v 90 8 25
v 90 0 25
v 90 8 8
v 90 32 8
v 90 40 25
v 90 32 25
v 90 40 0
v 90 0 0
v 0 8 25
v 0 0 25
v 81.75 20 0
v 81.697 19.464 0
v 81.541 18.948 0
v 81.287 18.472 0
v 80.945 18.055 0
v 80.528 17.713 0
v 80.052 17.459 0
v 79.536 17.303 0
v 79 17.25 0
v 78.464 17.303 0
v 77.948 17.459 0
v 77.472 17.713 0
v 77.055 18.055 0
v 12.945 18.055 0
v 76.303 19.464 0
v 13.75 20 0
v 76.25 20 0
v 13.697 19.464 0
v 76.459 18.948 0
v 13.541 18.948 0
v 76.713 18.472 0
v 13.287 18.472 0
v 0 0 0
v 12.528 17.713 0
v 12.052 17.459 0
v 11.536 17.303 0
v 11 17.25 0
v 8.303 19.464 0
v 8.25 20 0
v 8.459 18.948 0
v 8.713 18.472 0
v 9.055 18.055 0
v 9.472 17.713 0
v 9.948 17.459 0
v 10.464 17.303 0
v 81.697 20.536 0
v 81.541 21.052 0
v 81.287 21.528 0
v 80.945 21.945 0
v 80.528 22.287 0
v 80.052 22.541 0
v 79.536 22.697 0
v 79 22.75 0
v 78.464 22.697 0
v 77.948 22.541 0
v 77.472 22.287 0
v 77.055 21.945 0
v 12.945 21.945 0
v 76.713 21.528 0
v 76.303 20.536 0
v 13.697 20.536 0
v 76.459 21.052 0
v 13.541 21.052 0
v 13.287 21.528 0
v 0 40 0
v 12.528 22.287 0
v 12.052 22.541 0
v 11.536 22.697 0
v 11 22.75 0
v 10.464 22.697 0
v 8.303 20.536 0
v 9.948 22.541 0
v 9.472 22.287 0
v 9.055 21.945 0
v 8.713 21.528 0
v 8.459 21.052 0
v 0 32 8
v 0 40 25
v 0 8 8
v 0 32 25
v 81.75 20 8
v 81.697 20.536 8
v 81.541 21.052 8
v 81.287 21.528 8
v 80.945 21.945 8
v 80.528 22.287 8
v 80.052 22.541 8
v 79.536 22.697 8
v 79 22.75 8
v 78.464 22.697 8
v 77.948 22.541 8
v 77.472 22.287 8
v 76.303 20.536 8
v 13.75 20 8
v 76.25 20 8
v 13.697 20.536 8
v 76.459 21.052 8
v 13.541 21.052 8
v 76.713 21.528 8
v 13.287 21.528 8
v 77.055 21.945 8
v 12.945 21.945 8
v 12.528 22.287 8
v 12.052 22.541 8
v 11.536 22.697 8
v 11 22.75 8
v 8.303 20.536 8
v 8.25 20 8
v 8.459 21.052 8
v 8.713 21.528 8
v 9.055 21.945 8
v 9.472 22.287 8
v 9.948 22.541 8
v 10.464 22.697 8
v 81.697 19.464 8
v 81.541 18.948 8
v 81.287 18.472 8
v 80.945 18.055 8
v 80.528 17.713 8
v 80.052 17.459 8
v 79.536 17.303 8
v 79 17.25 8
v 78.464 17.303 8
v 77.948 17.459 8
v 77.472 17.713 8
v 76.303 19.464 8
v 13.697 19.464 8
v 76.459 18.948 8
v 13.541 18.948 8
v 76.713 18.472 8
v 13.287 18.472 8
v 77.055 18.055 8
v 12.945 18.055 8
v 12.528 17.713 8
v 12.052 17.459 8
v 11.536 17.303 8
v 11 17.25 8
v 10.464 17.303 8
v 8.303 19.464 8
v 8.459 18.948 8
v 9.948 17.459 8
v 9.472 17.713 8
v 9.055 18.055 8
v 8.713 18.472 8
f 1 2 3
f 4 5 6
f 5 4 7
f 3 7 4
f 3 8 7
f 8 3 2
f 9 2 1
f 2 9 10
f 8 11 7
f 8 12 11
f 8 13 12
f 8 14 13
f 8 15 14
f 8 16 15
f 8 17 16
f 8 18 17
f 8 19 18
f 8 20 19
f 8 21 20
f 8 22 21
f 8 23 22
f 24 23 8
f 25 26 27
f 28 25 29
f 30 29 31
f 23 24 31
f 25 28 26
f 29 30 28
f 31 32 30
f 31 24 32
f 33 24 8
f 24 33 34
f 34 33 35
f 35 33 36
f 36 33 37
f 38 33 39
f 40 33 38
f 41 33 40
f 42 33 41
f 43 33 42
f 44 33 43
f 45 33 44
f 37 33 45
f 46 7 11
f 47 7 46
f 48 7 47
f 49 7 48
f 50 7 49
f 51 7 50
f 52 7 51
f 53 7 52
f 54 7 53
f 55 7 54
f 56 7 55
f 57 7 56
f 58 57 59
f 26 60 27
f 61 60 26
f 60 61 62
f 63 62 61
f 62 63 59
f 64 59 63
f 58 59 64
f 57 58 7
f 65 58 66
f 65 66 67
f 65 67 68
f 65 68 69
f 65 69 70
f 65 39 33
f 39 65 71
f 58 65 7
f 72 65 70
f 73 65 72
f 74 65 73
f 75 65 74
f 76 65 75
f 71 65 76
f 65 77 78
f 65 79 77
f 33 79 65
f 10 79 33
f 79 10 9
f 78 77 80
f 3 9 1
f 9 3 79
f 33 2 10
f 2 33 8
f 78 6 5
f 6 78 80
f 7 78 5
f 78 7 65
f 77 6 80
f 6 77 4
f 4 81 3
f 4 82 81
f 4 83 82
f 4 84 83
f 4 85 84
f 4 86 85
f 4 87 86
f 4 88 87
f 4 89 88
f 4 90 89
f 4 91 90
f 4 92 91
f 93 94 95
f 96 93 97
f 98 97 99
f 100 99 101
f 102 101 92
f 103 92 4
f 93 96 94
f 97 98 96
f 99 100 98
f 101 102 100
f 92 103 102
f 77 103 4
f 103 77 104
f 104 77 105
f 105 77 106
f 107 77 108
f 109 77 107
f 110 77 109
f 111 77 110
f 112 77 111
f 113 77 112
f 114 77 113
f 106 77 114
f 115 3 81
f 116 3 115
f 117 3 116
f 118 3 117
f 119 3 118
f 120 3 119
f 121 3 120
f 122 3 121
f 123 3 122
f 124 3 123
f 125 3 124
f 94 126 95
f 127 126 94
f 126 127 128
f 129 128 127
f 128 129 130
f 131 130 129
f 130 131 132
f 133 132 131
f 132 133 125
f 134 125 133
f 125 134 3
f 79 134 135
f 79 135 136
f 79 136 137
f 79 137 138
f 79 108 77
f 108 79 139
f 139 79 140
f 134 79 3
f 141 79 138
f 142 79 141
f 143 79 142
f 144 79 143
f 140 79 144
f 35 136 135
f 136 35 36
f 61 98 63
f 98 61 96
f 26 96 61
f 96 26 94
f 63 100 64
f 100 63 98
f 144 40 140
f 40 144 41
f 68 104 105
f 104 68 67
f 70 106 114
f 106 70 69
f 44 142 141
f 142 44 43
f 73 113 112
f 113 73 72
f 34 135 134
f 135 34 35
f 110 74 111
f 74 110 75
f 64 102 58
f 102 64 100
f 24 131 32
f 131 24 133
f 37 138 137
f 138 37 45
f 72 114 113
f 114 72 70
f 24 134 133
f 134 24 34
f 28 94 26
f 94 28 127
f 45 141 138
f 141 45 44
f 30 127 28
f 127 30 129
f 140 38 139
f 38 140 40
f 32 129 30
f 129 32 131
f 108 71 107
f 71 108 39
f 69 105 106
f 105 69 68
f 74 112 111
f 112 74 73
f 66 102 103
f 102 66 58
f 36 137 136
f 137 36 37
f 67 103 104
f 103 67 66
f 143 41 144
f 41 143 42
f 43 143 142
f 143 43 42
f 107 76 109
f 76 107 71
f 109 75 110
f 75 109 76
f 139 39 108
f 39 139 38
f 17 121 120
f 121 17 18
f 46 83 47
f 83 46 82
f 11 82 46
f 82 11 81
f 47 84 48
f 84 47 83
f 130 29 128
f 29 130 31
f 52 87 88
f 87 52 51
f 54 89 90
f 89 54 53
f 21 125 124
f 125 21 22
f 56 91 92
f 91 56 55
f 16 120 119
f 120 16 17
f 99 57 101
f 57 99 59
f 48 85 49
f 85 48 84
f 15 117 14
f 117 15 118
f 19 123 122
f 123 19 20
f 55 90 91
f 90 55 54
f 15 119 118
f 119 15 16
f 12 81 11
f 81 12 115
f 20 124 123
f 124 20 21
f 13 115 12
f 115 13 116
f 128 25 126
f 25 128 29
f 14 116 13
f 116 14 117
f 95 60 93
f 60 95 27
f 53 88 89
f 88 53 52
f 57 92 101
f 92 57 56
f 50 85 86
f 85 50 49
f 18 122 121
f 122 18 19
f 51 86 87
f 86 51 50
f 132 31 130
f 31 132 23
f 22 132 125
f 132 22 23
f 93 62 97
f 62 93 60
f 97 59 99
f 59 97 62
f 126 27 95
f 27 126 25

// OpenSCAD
$fn = 32;

// ----------------------------------------------------------------------
// U-bracket: 90 x 40 x 25 mm
// ----------------------------------------------------------------------

// --- parameters (mm) ---
base_len = 90;            // outer length, X
channel_w = 40;           // outer width, Y
upright_h = 25;           // upright height, Z
mat_t = 8;                // wall thickness
hole_d = 5.5;             // clearance for M5

module hole_z(px, py) {
  translate([px, py, -2.5]) cylinder(h = mat_t + 5, d = hole_d);
}
module hole_y_pz(pz) {
  /* through both uprights along Y */
  translate([0, -2.5, pz]) rotate([-90, 0, 0]) cylinder(h = channel_w + 5, d = hole_d);
}

module base() {
  cube([base_len, channel_w, mat_t]);
}

module uprights() {
  cube([base_len, mat_t, upright_h]);
  translate([0, channel_w - mat_t, 0]) cube([base_len, mat_t, upright_h]);
}

difference() {
  union() {
    base();
    uprights();
  }
  hole_z(11, 20);
  hole_z(79, 20);
}
